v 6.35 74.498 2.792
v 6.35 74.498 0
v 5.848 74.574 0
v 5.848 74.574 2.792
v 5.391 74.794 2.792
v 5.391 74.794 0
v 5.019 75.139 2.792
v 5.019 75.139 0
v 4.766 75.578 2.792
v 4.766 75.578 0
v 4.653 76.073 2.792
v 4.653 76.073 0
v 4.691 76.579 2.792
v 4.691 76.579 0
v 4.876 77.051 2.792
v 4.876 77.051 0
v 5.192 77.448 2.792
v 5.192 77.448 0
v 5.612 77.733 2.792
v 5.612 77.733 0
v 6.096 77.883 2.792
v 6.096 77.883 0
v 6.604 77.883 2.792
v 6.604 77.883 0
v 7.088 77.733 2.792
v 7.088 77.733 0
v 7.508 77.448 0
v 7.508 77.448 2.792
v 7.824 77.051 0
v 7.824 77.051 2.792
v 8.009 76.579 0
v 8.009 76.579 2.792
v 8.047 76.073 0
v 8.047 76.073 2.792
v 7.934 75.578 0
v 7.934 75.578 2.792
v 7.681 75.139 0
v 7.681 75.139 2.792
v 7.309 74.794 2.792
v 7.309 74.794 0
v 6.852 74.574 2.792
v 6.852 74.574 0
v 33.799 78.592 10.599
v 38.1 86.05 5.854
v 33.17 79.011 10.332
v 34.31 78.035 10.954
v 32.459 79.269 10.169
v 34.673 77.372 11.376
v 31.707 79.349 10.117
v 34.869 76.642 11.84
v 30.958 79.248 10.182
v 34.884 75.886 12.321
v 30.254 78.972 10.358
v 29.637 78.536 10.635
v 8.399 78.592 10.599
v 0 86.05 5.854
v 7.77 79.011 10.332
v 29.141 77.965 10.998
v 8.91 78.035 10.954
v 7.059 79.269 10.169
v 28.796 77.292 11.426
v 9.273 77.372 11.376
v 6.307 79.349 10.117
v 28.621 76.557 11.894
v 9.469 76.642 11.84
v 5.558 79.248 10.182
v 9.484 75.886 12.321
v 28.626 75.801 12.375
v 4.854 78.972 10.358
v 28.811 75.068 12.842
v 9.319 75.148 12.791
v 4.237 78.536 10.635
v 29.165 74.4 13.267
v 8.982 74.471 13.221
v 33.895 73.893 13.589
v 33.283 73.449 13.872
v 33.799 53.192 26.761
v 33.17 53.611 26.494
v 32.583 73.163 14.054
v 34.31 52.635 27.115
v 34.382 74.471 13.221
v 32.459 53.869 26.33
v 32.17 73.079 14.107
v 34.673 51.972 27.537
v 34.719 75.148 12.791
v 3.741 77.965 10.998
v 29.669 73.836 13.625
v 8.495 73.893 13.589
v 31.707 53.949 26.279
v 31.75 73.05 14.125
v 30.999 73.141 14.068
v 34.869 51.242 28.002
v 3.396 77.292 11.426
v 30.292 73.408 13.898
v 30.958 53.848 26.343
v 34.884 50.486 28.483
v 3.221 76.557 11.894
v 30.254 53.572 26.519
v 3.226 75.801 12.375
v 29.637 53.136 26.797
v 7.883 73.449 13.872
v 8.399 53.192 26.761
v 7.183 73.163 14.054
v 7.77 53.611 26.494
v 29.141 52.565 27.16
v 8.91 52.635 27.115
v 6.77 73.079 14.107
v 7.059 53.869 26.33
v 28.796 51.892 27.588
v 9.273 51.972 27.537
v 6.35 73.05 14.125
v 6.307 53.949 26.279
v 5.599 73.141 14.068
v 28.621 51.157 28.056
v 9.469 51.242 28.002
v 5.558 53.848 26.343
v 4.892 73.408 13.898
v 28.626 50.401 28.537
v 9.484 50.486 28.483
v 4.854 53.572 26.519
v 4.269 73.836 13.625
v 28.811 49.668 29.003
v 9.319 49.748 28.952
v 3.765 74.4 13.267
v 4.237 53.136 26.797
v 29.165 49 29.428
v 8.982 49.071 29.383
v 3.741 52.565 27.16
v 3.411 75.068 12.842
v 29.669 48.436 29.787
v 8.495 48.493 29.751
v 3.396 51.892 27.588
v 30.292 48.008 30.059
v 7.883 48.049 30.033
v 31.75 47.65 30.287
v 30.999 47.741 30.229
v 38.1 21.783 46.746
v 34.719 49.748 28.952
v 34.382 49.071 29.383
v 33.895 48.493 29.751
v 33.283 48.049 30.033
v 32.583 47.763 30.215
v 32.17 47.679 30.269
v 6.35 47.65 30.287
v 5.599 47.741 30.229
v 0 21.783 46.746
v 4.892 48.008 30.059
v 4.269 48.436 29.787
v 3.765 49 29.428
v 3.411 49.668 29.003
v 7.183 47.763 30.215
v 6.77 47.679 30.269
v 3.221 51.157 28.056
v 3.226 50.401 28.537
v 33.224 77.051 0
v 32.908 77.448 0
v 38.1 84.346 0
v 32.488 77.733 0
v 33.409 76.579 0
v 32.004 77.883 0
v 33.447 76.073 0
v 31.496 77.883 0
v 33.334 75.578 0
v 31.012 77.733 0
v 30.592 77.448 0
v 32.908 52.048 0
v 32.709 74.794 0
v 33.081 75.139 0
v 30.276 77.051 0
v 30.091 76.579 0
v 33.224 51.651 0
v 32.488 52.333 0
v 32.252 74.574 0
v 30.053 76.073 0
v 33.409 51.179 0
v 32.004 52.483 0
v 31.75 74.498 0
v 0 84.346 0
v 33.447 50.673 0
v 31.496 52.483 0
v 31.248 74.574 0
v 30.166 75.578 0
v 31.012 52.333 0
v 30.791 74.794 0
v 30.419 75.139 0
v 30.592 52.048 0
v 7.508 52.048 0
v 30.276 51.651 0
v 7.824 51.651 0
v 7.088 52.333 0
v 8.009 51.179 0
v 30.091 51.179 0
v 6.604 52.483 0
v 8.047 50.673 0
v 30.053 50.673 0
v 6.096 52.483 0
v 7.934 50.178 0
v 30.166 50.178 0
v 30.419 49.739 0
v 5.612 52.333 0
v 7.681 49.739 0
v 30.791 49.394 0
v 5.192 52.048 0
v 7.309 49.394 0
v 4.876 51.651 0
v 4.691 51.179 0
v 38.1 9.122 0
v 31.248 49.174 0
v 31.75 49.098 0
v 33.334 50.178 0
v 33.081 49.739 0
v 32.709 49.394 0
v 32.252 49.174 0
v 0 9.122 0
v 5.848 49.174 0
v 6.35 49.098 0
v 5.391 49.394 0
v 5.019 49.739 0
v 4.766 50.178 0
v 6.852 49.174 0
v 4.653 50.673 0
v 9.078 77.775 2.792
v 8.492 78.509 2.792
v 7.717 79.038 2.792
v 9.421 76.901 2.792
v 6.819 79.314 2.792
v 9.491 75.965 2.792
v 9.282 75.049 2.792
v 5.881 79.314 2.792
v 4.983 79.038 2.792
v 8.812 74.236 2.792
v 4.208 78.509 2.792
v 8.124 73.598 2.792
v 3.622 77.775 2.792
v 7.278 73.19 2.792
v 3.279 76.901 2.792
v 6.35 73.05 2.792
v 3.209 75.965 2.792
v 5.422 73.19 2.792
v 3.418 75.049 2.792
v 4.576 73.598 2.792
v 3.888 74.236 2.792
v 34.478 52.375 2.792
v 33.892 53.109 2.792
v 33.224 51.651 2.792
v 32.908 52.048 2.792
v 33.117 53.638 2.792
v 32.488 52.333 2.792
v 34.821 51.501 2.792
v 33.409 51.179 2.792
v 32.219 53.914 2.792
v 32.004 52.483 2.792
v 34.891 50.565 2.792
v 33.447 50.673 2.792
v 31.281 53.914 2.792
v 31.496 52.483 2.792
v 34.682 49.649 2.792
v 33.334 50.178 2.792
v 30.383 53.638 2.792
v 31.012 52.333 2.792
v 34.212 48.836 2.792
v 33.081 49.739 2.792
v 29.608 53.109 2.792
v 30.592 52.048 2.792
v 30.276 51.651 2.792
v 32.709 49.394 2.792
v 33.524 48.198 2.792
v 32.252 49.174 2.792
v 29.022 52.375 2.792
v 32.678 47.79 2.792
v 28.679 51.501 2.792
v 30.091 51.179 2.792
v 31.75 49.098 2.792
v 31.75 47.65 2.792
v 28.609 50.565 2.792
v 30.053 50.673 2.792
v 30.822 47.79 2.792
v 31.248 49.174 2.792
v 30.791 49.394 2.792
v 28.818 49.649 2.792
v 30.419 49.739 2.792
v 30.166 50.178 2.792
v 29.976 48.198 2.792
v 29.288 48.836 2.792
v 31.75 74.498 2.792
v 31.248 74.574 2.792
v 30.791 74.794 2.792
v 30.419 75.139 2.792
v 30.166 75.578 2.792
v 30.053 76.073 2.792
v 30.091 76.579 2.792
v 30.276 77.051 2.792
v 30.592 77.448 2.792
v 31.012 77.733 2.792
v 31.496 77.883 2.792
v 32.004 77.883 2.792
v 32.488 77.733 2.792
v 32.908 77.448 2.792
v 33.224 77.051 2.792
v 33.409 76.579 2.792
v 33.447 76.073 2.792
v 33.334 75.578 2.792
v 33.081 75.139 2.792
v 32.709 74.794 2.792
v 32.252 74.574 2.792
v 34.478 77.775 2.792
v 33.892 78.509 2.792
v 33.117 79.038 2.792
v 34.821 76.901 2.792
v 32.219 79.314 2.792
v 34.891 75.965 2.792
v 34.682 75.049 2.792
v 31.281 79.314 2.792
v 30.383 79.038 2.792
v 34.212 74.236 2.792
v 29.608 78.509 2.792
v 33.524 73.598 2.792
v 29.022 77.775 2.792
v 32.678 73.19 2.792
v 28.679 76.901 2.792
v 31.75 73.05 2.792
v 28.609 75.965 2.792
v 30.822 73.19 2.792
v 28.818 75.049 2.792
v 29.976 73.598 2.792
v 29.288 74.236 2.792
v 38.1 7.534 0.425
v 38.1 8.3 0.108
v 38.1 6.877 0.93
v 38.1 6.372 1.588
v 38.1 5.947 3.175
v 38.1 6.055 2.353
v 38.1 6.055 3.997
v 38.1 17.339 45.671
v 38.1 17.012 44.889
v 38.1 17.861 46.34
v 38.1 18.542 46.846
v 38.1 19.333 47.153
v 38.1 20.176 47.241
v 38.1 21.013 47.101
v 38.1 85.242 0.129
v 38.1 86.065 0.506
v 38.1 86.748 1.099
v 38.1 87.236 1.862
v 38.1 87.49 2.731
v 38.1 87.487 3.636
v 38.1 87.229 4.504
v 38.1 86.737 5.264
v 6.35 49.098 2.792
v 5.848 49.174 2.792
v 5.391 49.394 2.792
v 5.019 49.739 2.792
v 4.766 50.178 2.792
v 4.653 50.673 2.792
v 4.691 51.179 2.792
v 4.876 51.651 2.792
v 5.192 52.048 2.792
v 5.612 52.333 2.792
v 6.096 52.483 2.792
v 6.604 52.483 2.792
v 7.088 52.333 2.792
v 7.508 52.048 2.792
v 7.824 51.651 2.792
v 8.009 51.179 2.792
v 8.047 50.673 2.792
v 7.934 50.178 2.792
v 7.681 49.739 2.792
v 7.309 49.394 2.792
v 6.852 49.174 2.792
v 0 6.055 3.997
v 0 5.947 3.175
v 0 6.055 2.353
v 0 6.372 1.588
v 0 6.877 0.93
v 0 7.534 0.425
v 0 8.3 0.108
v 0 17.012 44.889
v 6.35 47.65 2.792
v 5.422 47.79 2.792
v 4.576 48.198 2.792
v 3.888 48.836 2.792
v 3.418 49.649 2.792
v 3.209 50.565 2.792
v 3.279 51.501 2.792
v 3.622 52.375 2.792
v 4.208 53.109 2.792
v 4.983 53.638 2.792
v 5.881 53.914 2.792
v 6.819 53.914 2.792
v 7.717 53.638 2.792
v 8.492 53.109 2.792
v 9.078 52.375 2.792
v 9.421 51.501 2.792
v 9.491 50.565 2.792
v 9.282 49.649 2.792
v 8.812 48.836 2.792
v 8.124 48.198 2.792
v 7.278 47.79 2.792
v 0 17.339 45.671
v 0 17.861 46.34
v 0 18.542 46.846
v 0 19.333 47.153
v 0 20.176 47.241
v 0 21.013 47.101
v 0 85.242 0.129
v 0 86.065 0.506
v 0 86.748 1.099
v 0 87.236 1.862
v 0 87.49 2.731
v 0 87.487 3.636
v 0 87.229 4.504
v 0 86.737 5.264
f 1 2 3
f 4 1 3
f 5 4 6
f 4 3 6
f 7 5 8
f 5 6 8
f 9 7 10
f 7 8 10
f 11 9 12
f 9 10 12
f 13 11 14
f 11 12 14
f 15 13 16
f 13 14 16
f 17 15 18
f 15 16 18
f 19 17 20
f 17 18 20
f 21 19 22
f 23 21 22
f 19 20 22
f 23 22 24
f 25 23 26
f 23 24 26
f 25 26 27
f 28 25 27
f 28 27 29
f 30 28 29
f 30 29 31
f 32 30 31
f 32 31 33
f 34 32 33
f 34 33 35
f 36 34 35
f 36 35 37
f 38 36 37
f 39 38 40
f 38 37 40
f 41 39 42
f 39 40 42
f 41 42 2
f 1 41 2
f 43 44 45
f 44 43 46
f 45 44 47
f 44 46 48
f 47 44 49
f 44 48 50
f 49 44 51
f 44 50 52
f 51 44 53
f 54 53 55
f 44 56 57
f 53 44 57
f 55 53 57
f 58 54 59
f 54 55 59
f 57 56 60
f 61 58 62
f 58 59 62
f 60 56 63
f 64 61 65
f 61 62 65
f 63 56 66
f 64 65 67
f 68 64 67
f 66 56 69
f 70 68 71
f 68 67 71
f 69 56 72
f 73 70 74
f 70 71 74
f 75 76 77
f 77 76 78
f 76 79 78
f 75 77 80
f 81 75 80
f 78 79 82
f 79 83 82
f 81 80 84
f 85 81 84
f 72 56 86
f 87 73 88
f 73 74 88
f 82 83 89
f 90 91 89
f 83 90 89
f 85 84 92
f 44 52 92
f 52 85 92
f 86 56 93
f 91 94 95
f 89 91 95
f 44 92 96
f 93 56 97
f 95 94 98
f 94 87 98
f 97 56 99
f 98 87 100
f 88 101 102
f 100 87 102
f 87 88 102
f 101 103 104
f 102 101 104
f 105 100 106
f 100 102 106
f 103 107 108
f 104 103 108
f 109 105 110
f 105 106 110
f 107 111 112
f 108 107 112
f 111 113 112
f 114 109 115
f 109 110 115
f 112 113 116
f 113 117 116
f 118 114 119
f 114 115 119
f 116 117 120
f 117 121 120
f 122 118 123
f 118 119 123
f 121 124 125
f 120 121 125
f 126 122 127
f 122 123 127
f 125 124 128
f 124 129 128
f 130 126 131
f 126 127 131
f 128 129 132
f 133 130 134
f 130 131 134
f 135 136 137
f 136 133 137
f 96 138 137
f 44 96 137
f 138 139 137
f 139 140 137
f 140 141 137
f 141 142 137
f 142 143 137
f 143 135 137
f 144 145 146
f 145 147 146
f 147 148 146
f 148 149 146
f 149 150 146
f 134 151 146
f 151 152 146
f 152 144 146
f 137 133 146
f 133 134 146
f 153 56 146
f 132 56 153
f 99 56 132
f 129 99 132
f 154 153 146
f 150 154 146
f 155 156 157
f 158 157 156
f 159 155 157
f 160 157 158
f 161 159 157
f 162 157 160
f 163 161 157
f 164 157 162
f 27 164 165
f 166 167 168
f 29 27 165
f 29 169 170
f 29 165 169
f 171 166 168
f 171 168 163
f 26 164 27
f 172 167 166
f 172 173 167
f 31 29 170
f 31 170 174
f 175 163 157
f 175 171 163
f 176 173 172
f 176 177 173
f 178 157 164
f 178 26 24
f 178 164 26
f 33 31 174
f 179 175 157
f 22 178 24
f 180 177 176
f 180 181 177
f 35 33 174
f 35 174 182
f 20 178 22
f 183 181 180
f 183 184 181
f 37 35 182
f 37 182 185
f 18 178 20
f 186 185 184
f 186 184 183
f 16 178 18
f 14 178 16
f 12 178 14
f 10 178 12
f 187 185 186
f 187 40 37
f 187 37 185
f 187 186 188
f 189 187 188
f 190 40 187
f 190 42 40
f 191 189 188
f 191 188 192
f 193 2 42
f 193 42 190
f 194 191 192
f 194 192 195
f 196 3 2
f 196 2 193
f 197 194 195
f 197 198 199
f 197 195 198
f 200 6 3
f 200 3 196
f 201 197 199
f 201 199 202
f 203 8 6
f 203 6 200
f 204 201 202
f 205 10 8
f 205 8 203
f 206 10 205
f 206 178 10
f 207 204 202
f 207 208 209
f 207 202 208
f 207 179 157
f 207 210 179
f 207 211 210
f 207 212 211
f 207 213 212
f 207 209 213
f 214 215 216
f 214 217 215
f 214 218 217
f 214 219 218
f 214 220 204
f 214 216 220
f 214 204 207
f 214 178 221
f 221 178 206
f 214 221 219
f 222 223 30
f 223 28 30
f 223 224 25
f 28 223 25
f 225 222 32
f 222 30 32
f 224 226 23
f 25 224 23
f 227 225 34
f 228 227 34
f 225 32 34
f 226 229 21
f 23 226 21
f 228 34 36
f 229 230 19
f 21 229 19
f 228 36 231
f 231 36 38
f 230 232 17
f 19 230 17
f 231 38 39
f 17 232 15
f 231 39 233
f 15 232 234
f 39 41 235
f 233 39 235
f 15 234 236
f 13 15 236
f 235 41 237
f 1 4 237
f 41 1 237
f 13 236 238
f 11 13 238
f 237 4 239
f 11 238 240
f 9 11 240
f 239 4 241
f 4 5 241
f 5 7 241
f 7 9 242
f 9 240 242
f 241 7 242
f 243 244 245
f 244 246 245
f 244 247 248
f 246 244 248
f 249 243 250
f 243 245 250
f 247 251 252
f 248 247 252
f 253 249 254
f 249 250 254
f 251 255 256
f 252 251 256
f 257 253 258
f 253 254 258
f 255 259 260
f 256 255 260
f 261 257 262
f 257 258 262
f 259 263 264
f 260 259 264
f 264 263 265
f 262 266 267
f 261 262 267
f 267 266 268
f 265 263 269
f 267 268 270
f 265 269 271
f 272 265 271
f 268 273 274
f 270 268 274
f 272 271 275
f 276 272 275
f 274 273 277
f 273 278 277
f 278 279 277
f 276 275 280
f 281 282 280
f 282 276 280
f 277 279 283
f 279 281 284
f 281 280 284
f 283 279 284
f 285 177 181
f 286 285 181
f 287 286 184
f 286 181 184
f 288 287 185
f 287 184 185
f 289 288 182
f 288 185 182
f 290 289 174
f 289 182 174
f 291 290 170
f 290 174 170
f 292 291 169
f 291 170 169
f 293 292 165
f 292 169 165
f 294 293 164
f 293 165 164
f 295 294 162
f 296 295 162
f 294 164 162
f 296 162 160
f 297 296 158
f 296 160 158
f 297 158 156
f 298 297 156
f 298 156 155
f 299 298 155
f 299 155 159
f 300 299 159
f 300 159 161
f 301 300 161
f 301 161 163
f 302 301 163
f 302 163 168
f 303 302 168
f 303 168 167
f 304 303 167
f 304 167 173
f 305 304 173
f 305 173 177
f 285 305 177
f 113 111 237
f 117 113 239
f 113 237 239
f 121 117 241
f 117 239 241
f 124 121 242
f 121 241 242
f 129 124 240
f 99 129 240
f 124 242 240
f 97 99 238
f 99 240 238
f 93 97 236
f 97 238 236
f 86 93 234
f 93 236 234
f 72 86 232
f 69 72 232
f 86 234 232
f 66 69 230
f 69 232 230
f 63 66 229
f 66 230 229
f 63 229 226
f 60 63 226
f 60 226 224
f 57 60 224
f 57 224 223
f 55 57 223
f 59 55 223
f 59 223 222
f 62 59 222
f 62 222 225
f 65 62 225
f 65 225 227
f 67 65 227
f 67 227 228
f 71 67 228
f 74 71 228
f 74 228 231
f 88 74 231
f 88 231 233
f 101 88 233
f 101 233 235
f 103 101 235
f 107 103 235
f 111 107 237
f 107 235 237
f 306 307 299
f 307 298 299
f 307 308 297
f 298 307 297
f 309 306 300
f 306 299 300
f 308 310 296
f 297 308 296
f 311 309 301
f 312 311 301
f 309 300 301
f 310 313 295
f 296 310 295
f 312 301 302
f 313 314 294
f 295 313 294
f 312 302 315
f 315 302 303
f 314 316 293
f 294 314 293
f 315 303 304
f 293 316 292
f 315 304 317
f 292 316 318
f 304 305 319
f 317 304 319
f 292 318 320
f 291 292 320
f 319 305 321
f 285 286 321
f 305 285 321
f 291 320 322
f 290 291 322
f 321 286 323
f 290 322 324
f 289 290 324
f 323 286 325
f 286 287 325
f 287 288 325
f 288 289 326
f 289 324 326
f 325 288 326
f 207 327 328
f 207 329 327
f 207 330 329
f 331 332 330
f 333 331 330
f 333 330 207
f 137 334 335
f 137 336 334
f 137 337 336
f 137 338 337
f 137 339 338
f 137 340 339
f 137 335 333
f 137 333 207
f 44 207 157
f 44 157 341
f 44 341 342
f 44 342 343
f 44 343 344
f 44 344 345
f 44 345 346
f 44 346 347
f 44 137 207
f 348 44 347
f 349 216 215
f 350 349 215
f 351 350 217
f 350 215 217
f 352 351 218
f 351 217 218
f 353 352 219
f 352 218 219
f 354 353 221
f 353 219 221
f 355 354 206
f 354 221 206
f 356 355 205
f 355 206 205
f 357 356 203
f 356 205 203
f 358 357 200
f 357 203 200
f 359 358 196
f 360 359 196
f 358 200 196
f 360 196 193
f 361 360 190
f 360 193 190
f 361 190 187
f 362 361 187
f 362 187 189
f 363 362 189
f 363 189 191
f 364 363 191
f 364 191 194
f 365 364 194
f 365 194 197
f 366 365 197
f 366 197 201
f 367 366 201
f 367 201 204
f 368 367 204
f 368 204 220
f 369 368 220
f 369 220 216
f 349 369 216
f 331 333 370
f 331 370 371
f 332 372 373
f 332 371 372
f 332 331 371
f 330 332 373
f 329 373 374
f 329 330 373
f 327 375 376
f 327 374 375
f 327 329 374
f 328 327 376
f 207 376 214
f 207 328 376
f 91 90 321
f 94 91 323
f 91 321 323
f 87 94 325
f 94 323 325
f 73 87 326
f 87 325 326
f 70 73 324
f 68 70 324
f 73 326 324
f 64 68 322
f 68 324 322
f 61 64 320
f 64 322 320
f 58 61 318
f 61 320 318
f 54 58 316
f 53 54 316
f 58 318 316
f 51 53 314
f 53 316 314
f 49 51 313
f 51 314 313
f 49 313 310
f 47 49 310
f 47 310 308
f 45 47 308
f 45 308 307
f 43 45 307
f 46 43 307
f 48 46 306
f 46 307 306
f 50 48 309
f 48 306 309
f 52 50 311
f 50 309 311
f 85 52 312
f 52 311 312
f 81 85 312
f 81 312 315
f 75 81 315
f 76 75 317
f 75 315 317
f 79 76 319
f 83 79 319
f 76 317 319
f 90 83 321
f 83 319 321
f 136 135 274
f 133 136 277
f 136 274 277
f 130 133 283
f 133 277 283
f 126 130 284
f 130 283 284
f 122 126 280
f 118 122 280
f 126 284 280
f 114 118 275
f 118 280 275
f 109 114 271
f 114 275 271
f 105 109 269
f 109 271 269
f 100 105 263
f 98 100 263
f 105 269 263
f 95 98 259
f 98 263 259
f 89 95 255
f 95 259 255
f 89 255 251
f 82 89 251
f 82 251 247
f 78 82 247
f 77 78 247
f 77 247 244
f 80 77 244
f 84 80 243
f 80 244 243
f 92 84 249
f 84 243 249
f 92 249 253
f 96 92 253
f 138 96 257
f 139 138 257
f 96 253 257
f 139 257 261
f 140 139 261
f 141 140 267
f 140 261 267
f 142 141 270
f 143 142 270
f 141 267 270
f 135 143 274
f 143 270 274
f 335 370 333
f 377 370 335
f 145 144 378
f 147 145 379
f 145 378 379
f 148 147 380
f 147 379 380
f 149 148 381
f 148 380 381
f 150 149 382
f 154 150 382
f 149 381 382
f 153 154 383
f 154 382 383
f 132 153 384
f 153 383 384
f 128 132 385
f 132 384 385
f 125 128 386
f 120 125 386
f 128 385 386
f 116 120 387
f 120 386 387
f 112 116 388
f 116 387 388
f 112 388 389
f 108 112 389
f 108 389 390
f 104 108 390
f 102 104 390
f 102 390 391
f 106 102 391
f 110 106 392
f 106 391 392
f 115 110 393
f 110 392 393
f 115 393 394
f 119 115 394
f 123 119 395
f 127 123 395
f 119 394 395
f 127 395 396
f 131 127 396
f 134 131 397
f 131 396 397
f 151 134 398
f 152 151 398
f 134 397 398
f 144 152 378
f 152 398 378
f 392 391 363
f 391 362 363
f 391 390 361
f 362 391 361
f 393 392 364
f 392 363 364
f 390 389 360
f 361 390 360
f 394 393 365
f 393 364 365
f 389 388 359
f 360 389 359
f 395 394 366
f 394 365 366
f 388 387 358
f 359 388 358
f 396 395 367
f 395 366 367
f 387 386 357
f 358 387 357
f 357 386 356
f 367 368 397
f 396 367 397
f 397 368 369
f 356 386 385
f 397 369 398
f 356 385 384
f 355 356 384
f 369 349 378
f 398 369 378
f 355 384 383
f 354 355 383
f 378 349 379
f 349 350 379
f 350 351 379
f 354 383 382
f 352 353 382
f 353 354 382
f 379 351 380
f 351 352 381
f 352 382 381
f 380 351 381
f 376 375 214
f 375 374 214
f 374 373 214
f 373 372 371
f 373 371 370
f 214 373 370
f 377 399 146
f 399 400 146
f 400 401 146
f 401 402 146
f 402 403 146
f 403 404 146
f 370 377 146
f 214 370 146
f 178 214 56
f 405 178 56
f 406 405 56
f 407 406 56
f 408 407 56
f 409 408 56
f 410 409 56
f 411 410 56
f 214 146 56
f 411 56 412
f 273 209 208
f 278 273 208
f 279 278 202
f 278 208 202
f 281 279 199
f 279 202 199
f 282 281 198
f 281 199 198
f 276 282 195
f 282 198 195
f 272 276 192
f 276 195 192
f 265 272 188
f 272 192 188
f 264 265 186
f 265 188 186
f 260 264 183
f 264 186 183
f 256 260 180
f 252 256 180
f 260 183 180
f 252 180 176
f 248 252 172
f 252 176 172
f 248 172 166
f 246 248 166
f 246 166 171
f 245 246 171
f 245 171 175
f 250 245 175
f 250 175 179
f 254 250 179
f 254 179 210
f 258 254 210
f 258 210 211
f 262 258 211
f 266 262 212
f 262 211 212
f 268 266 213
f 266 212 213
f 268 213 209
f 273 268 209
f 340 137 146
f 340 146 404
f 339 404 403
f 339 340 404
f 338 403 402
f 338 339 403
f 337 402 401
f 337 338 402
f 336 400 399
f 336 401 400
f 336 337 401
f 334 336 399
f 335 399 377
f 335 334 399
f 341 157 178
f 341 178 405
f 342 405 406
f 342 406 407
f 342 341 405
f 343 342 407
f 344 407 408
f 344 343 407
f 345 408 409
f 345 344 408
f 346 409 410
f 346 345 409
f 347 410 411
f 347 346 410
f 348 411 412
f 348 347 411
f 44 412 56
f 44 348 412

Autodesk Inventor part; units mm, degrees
ref_plane "YZ Plane" through (0, 0, 0) normal (1, 0, 0) x (0, 1, 0)
ref_plane "XZ Plane" through (0, 0, 0) normal (0, 1, 0) x (-1, 0, 0)
sketch "Sketch1" plane through (0, 0, 0) normal (1, 0, 0) x (0, 1, 0)
  line L0 (95.25, 0) -> (18.1319, 49.069)
  line L1 (0, 0) -> (0, -18.6) construction
  line L2 (95.25, 0) -> (4.9839, 0)
  line L3 (4.9839, 0) -> (18.1319, 49.069)
  dimension "d24" = 18.6
  dimension "d25" = 15
  dimension "d26" = 50.8
  dimension "d27" = 95.25
extrude "Extrusion1" add sketch "Sketch1" along normal blind 38.1
fillet "Fillet1" radius 3.175 3 edges at (19.05, 95.25, 0) (19.05, 4.9839, 0) (19.05, 18.1319, 49.069)
ref_plane "Work Plane1" through (0, 20.0786, 47.2421) normal (0, 0, -1) x (-1, 0, 0)
sketch "Sketch2" plane through (0, 20.0786, 47.2421) normal (0, 0, -1) x (-1, 0, 0)
  line L0 (0, 65.9715) -> (0, 1.7044) projected
  line L1 (-38.1, -14.0238) -> (0, -14.0238) projected
  point P0 (0, -20.0786)
  point P1 (-6.35, 56.1214)
  point P2 (-6.35, 30.7214)
  point P3 (-31.75, 56.1214)
  point P4 (-31.75, 30.7214)
  dimension "d28" = 76.2
  dimension "d29" = 6.35
  dimension "d32" = 25.4
  dimension "d35" = 25.4
hole "Hole1" at (6.35, 76.2, 47.2421) at (31.75, 76.2, 47.2421) at (6.35, 50.8, 47.2421) at (31.75, 50.8, 47.2421) direction (0, 0, -1) diameter 3.4036 end through all counterbore diameter 6.2992 counterbore depth 44.45 clearance for "Flat Head Machine Screw" size "M3" standard "Ansi Metric M Profile"
properties part number "CC-bottomStand" material "ABS Plastic"
